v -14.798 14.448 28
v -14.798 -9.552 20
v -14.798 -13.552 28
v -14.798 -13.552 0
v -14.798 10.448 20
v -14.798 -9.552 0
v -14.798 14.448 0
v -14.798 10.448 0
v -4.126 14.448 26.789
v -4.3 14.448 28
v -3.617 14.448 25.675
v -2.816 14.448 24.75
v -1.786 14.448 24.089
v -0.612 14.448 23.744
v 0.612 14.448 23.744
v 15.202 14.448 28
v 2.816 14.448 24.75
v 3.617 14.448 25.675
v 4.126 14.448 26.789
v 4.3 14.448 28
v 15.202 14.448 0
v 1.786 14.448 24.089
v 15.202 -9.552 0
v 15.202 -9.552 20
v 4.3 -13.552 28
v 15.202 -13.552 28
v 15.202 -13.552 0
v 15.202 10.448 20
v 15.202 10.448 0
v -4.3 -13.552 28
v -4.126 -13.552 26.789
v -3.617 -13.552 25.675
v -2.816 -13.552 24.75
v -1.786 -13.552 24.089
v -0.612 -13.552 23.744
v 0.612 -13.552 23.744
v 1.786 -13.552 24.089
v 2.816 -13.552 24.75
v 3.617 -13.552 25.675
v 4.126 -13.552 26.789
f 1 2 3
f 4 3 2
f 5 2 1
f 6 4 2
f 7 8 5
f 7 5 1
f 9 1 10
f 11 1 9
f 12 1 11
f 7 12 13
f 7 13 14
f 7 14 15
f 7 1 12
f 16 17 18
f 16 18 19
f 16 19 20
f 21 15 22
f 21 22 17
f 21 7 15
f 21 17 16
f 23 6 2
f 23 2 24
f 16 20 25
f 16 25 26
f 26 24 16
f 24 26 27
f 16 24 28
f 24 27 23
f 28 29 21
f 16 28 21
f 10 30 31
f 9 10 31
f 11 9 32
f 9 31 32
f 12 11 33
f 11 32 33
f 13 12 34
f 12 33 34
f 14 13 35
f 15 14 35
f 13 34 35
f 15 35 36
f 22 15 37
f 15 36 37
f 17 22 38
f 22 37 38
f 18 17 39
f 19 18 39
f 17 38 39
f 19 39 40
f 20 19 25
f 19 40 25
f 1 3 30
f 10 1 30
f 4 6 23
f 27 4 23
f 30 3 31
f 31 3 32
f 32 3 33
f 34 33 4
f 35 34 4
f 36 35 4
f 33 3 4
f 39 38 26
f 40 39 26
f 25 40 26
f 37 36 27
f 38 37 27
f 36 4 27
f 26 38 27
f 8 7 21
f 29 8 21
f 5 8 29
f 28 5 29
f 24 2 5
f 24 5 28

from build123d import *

# Parameters (mm, degrees)
F0_W     = 30
F0_H     = 28
F1_DEPTH = 28
F3_DEPTH = 28.001
F4_W     = 30
F4_H     = 20
F5_DEPTH = 20


with BuildPart() as f1:
    # F0 (on Top) → F1 (new body)
    with BuildSketch(Plane.XY):
        with Locations((0.2024, 0.448397)):
            Rectangle(F0_W, F0_H)
    extrude(amount=F1_DEPTH)

    # F2 (on face) → F3 (cut, through all)
    with BuildSketch(Plane.XZ.offset(13.551603)):
        with BuildLine():
            ThreePointArc((-4.3, 28), (0, 23.7), (4.3, 28))
            Line((4.3, 28), (-4.3, 28))
        make_face()
    extrude(amount=-F3_DEPTH, mode=Mode.SUBTRACT)

    # F4 (on face) → F5 (cut)
    with BuildSketch(Plane(origin=(0, 0, 0), x_dir=(1, 0, 0), z_dir=(0, 0, -1))):
        with Locations((0.2024, -0.448397)):
            Rectangle(F4_W, F4_H)
    extrude(amount=-F5_DEPTH, mode=Mode.SUBTRACT)


solid = f1.part
